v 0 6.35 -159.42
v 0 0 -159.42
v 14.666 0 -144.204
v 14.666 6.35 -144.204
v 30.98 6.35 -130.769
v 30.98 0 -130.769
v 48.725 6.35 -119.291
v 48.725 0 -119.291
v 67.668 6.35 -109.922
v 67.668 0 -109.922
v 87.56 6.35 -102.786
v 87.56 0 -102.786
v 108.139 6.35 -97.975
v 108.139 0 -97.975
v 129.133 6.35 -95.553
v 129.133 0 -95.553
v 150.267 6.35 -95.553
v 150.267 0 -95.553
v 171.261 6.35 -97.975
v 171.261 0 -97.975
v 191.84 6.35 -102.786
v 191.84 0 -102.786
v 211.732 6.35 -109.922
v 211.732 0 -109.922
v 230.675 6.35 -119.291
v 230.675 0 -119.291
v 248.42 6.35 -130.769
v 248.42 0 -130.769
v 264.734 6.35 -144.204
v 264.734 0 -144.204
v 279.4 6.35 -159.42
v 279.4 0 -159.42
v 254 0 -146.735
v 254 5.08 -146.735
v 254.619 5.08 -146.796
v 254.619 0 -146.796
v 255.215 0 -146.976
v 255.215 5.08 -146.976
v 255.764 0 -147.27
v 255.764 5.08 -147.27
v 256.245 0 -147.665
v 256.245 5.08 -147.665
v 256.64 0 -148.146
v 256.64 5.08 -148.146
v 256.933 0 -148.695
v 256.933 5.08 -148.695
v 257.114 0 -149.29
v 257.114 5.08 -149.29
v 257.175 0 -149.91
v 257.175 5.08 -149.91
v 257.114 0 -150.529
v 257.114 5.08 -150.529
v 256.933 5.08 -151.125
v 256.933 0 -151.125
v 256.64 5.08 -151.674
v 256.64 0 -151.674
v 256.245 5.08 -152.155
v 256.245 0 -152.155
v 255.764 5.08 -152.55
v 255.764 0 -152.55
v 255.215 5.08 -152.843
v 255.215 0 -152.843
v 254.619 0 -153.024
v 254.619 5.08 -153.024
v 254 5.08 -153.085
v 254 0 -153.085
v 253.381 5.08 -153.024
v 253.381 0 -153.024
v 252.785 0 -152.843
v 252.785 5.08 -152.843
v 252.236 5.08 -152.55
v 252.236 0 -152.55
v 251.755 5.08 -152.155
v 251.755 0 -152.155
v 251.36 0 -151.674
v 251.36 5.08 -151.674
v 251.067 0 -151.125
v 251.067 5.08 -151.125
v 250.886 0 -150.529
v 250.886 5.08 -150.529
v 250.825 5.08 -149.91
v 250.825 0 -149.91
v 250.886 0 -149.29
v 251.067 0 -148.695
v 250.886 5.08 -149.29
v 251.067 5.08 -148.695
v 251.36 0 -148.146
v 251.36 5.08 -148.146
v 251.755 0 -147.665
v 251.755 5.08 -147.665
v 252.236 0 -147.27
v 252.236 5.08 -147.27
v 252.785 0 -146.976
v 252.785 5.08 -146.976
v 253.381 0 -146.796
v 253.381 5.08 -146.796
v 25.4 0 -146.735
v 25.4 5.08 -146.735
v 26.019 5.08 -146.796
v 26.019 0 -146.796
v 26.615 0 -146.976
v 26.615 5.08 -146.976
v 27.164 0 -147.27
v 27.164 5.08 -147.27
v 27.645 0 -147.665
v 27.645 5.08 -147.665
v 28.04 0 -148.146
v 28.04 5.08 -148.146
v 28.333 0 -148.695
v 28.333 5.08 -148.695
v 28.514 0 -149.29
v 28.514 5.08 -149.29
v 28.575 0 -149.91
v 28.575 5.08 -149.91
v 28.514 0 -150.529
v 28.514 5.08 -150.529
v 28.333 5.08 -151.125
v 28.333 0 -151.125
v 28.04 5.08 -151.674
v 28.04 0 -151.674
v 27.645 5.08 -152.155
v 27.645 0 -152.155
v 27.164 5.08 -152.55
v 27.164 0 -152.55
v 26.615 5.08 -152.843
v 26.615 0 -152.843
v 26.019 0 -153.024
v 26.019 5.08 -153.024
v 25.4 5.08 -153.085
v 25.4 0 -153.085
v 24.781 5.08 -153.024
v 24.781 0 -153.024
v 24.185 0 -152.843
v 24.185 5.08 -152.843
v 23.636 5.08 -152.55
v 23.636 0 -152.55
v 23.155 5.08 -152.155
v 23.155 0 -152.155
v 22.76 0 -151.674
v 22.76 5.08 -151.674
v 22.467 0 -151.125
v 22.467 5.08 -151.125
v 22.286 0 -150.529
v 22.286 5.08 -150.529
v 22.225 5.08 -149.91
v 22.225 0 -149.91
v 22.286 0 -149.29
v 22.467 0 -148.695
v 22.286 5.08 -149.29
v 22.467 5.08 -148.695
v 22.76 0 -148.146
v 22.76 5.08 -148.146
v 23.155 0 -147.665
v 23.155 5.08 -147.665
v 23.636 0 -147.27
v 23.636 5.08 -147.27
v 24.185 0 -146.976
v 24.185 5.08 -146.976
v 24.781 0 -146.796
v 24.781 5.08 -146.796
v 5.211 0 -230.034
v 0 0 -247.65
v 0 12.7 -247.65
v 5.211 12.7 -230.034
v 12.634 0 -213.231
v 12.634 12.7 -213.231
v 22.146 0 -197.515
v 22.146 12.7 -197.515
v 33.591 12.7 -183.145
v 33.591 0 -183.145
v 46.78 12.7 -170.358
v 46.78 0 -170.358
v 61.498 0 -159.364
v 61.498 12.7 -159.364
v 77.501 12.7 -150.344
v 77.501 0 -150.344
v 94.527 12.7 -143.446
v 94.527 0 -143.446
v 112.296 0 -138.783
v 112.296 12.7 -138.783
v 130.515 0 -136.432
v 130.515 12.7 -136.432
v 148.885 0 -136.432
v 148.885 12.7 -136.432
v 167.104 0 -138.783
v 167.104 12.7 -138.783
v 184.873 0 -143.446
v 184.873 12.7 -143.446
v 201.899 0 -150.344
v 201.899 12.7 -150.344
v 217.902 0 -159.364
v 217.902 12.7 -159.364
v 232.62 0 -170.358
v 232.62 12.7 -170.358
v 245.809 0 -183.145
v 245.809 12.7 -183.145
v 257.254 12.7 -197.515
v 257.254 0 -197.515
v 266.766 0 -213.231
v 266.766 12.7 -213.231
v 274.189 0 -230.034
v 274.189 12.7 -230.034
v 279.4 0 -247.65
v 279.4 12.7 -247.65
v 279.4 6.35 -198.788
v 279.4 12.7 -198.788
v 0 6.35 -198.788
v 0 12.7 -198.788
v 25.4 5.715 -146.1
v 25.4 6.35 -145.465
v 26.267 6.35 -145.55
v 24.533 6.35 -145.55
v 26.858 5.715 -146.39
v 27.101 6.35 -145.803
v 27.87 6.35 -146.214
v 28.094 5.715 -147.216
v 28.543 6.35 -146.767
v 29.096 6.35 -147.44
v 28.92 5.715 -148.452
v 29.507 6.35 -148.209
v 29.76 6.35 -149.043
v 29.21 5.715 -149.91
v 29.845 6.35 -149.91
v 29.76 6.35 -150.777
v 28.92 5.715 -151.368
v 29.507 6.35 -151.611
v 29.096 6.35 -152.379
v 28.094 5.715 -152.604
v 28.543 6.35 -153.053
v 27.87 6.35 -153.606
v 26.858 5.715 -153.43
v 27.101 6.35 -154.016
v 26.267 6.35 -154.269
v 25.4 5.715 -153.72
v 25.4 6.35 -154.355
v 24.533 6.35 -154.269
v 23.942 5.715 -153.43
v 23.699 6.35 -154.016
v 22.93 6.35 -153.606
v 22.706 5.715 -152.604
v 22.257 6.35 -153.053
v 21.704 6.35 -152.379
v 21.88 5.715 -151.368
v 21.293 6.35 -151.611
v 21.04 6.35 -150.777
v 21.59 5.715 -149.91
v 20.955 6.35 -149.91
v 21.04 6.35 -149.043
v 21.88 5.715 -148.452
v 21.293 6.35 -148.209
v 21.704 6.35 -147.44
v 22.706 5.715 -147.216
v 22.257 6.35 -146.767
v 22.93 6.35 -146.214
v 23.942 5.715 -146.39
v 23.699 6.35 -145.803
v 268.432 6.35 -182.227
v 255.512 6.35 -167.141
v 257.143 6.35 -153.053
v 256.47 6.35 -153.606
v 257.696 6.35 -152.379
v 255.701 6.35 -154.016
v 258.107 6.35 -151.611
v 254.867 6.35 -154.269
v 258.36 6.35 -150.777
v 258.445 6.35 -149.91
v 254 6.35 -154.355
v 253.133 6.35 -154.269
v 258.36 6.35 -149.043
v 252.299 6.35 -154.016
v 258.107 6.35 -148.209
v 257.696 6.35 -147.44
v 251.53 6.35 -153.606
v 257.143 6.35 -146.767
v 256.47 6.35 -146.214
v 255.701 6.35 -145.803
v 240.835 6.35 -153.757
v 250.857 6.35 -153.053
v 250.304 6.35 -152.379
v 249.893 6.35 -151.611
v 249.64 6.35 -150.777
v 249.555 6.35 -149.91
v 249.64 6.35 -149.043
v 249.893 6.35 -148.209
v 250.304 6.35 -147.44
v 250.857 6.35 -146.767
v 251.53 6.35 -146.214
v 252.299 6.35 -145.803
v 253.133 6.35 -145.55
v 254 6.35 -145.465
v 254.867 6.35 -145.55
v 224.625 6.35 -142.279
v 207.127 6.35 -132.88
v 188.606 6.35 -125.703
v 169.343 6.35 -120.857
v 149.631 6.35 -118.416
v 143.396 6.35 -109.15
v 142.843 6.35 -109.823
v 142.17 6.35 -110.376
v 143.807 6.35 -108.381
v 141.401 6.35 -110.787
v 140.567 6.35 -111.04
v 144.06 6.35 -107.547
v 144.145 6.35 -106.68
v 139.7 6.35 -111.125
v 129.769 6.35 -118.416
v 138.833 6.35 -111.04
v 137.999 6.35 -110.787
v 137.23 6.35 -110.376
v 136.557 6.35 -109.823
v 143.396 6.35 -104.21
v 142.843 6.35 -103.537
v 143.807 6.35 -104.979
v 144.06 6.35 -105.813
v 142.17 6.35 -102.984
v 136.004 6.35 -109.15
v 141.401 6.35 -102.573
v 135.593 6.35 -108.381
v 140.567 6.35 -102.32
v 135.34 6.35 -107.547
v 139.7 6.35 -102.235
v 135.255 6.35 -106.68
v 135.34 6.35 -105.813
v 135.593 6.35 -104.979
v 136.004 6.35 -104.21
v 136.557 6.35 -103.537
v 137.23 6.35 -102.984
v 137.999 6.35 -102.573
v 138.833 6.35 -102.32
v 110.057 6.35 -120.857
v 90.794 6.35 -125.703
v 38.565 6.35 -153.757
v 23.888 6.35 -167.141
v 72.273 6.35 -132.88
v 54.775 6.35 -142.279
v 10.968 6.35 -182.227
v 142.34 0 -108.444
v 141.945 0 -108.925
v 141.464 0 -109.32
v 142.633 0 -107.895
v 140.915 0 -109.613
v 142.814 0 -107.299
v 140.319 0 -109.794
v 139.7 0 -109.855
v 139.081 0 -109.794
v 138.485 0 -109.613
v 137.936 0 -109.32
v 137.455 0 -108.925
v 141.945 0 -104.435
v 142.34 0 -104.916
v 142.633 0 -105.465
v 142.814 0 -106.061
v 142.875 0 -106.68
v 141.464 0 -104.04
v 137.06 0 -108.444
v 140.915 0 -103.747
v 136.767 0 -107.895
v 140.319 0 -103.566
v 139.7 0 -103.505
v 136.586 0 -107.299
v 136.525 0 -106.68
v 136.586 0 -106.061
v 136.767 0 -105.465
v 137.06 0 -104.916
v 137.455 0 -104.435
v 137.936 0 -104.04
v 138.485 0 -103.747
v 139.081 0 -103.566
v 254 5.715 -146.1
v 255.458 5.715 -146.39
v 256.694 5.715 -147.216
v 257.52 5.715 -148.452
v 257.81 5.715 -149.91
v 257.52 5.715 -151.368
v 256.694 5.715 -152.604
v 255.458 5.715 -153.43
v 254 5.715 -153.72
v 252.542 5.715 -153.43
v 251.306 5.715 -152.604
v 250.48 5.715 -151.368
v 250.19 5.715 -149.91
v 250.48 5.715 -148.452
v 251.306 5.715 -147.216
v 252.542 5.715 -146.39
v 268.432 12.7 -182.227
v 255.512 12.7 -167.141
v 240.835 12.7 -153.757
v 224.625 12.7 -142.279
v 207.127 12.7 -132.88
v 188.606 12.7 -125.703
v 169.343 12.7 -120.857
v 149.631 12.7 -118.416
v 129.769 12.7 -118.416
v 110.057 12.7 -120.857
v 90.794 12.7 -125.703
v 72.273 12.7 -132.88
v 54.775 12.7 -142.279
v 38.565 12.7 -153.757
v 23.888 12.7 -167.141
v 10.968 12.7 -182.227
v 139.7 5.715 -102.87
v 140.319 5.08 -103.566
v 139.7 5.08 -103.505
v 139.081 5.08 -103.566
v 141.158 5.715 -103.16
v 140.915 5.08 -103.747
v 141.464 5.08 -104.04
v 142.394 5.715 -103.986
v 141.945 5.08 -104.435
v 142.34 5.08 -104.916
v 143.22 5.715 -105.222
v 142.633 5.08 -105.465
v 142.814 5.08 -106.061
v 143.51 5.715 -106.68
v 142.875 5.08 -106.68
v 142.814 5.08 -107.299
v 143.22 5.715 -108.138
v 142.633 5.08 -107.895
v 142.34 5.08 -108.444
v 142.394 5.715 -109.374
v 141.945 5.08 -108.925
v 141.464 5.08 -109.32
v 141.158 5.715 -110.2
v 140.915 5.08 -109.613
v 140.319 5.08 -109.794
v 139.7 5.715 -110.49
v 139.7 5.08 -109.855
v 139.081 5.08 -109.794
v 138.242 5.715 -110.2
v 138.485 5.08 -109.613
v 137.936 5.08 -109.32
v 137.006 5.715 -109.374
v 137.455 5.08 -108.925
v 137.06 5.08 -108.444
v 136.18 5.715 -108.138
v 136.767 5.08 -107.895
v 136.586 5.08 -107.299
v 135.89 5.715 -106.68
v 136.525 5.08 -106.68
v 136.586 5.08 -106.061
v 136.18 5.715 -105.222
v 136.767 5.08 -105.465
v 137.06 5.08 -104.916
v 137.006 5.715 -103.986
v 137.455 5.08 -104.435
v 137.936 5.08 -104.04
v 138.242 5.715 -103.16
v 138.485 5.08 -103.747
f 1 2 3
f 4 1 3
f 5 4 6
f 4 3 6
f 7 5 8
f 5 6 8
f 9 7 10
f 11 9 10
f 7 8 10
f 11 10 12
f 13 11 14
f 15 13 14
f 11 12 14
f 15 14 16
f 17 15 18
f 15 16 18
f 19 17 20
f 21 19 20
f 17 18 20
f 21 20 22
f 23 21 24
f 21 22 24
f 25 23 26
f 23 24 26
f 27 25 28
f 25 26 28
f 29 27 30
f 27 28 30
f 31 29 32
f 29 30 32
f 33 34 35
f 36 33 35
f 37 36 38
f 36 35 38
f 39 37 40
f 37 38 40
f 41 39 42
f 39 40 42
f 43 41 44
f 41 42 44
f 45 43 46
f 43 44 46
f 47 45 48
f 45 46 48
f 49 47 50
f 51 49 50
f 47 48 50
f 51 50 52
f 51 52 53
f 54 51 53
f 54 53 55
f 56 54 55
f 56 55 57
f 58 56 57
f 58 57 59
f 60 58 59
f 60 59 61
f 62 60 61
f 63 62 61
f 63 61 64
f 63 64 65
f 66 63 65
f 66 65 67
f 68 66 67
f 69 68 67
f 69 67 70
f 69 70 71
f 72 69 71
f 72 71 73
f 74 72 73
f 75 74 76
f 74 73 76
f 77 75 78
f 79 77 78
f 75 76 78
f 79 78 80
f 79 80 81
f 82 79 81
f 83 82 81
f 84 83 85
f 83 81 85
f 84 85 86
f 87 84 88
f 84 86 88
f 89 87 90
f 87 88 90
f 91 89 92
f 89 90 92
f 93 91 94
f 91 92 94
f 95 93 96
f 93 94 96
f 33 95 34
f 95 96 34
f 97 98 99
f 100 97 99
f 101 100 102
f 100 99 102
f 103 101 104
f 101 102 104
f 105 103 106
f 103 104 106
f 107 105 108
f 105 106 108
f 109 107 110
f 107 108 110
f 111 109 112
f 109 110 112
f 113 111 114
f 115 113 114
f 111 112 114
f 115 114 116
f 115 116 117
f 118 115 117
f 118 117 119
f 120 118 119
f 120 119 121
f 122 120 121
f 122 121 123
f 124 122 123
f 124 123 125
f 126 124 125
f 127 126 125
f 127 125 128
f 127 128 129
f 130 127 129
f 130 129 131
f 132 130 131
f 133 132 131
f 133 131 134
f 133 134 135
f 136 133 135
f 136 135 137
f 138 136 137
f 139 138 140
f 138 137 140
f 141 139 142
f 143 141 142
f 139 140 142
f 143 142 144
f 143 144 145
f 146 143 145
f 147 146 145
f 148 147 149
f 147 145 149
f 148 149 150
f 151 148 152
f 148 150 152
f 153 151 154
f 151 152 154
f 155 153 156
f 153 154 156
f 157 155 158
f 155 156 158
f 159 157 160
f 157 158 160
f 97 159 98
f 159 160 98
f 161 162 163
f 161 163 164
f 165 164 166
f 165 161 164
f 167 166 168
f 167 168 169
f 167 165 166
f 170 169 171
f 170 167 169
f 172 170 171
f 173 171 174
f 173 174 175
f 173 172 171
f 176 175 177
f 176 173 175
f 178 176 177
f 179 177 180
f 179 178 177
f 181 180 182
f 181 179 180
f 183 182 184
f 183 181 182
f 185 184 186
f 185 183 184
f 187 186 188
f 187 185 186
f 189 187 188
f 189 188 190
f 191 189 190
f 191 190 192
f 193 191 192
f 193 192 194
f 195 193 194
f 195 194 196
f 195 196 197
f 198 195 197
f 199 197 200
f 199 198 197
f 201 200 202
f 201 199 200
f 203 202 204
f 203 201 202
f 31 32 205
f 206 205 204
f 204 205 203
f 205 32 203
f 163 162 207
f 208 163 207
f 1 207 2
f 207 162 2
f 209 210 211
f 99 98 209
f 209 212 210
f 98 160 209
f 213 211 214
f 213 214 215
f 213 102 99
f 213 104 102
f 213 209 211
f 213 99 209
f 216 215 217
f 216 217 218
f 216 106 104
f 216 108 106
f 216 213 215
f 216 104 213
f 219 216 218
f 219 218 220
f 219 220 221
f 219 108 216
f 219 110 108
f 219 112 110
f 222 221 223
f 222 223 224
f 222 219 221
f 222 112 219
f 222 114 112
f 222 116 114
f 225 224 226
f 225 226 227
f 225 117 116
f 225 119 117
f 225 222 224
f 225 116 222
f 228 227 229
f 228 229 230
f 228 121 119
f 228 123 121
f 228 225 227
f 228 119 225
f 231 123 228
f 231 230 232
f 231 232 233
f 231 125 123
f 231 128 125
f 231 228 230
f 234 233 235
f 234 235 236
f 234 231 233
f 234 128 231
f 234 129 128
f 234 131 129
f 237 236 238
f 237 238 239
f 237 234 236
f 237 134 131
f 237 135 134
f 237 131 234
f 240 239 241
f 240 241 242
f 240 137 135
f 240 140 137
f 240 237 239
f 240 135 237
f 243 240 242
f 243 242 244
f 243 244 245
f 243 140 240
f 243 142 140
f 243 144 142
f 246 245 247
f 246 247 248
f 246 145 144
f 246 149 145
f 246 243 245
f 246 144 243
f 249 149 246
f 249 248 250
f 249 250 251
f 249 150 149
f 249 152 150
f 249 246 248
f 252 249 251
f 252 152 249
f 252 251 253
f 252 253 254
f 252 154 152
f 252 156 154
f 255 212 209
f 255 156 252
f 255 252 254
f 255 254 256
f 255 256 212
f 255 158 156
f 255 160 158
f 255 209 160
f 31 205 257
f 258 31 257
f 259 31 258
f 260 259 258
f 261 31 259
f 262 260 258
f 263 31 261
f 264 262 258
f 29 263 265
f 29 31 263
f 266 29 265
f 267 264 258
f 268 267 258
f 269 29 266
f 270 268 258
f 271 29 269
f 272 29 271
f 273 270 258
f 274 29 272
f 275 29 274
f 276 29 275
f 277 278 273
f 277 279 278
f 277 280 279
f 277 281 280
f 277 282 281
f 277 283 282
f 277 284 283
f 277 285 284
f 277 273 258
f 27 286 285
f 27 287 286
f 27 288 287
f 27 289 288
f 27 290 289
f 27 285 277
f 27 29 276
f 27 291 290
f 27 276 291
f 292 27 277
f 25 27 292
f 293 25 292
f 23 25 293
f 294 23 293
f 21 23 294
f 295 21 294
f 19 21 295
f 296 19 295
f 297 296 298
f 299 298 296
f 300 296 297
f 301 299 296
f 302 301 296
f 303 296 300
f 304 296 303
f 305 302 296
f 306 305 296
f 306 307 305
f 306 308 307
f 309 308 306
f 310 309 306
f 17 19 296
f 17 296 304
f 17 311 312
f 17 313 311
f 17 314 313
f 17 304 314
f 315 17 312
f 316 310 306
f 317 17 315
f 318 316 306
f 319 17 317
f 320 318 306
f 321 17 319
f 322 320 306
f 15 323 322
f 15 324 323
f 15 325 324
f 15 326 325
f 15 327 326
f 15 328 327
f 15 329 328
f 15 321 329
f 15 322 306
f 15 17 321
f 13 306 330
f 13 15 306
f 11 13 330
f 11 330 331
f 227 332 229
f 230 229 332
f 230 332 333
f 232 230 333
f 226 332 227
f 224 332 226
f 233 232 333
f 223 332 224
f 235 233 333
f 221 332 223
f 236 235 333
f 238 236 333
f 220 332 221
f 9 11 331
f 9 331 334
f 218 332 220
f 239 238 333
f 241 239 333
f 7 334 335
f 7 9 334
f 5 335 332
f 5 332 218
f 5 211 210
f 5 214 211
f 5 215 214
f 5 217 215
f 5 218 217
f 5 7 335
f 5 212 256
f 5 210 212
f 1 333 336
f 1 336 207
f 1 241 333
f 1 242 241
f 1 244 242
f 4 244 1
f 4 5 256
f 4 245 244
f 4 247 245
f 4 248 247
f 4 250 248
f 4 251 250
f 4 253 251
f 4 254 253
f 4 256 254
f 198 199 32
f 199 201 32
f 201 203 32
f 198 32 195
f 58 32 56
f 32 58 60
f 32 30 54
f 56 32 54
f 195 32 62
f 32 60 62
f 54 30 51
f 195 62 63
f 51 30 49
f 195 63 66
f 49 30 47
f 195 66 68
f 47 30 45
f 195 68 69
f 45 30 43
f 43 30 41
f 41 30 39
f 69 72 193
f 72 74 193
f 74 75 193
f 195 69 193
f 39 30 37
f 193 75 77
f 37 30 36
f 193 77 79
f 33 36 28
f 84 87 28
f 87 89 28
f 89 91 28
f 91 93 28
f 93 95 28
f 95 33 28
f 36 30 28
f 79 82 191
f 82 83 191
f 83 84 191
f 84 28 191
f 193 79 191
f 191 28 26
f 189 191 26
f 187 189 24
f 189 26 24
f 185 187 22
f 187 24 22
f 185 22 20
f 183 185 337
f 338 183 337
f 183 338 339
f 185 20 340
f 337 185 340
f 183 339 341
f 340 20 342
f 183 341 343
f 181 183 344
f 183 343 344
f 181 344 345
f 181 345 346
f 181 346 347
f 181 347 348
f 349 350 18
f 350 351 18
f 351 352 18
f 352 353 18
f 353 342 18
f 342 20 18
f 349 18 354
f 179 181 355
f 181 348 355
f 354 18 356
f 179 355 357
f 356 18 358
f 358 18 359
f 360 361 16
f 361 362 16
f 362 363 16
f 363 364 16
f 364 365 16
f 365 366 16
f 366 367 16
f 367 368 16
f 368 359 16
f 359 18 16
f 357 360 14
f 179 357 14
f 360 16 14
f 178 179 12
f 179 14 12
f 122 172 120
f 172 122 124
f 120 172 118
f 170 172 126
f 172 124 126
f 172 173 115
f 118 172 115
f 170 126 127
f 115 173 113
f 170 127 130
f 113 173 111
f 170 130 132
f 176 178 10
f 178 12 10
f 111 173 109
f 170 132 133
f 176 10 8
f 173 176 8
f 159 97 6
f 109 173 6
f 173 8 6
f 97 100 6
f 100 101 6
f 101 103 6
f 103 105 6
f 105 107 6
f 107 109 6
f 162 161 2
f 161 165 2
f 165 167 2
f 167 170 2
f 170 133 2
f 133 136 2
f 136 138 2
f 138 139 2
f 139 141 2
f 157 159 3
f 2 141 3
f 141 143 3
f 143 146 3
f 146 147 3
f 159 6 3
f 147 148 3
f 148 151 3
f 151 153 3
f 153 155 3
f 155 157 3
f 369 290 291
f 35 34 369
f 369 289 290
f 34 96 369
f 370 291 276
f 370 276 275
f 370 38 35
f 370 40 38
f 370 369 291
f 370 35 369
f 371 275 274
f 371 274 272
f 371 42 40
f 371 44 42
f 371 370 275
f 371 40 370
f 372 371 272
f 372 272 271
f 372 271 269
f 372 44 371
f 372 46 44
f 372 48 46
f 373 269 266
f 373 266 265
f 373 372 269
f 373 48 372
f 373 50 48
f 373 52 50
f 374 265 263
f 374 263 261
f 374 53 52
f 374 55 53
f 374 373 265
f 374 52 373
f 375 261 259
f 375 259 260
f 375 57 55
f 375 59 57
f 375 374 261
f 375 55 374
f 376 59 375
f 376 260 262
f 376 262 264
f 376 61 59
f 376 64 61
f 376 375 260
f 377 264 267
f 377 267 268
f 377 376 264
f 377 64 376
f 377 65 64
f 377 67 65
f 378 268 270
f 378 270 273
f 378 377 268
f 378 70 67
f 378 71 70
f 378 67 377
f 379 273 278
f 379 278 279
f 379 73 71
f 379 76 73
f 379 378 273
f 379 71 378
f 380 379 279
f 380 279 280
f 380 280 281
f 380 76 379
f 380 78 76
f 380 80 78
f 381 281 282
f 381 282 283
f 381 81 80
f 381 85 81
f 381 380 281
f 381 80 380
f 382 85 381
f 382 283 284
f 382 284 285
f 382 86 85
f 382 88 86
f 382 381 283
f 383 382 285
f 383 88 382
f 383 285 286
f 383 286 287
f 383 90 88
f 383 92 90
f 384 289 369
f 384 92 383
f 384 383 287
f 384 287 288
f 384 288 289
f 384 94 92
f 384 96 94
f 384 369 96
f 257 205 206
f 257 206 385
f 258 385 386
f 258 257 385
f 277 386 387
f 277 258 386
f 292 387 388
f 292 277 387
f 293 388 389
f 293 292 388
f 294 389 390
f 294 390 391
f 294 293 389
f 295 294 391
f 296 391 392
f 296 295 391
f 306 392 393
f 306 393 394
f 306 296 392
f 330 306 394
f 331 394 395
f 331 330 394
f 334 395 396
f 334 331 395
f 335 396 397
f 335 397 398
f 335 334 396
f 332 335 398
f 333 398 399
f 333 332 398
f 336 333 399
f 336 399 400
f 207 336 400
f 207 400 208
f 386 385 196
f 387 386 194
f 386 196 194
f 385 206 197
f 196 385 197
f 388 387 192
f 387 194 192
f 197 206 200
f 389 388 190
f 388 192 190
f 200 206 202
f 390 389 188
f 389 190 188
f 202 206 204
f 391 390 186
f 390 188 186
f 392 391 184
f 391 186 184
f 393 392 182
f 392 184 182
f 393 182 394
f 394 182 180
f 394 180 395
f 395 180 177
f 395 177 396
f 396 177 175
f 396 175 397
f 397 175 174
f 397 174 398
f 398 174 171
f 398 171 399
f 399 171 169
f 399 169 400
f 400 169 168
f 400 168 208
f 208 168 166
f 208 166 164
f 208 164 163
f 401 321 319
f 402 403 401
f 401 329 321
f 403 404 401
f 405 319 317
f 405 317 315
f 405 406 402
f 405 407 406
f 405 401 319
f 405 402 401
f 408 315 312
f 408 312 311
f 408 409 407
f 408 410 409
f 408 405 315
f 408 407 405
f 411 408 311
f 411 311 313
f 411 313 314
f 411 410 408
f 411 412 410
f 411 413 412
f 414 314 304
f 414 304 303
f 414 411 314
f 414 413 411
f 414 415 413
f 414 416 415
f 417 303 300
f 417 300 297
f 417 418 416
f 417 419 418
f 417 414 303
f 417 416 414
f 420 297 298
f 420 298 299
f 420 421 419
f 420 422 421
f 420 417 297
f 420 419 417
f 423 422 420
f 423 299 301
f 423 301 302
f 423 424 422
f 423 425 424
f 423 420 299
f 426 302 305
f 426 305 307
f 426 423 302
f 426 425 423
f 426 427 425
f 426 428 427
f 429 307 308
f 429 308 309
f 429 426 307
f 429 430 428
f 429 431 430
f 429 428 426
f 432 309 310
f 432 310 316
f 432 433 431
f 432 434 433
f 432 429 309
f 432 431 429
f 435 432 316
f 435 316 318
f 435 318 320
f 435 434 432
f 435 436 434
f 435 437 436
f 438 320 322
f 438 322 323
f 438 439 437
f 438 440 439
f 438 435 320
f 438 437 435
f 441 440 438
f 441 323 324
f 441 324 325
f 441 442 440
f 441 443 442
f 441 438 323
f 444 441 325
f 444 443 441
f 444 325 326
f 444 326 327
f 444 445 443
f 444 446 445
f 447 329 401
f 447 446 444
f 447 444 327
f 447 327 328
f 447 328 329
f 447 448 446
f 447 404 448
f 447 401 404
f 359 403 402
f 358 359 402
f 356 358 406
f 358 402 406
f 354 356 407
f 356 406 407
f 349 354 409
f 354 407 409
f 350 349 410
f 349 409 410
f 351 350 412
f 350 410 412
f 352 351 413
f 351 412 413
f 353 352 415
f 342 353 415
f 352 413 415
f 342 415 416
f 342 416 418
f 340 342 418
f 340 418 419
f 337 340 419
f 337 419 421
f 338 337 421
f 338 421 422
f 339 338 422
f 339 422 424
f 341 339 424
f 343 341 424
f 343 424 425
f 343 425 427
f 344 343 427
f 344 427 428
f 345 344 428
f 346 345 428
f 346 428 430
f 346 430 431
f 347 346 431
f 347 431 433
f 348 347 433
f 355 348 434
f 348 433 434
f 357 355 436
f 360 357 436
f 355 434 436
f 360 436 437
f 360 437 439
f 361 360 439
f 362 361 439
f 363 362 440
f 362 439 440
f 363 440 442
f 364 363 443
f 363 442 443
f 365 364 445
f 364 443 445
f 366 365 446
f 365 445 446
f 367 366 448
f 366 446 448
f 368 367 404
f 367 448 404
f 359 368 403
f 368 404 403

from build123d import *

# Parameters (mm, degrees)
BOSS_EXTRUDE1_DEPTH = 12.7
BOSS_EXTRUDE2_DEPTH = 6.35
SKETCH3_R           = 3.175
CUT_EXTRUDE1_DEPTH  = 12.7
CHAMFER1_SIZE       = 1.27


with BuildPart() as part:
    # Sketch1 → Boss-Extrude1 (new body)
    with BuildSketch(Plane(origin=(0, 0, 0), x_dir=(1, 0, 0), z_dir=(0, 1, 0))):
        with BuildLine():
            Line((279.4, 247.65), (279.4, 198.787506551))
            ThreePointArc((279.4, 198.787506551), (139.7, 118.11), (0, 198.787506551))
            Line((0, 198.787506551), (0, 247.65))
            ThreePointArc((0, 247.65), (139.7, 136.137470007), (279.4, 247.65))
        make_face()
    extrude(amount=BOSS_EXTRUDE1_DEPTH)

    # Sketch2 → Boss-Extrude2 (add)
    with BuildSketch(Plane.XZ):
        with BuildLine():
            Line((0, -198.787506551), (0, -159.420282964))
            ThreePointArc((0, -159.420282964), (139.7, -95.25), (279.4, -159.420282964))
            Line((279.4, -159.420282964), (279.4, -198.787506551))
            ThreePointArc((279.4, -198.787506551), (139.7, -118.11), (0, -198.787506551))
        make_face()
    extrude(amount=-BOSS_EXTRUDE2_DEPTH)

    # Sketch3 → Cut-Extrude1 (cut)
    with BuildSketch(Plane(origin=(0, 6.35, 0), x_dir=(1, 0, 0), z_dir=(0, 1, 0))):
        with Locations(Location((139.7, 106.68, 0), (0, 0, 270))):
            Circle(SKETCH3_R)
        with Locations(Location((25.4, 149.909813499, 0), (0, 0, 270))):
            Circle(SKETCH3_R)
        with Locations(Location((254, 149.909813499, 0), (0, 0, 270))):
            Circle(SKETCH3_R)
    extrude(amount=-CUT_EXTRUDE1_DEPTH, mode=Mode.SUBTRACT)

    # Chamfer1
    chamfer1_edges = [part.edges().sort_by_distance(p)[0] for p in [
        (139.7, 6.35, -109.855),
        (25.4, 6.35, -153.084813499),
        (254, 6.35, -153.084813499),
    ]]
    chamfer(chamfer1_edges, length=CHAMFER1_SIZE)


solid = part.part
